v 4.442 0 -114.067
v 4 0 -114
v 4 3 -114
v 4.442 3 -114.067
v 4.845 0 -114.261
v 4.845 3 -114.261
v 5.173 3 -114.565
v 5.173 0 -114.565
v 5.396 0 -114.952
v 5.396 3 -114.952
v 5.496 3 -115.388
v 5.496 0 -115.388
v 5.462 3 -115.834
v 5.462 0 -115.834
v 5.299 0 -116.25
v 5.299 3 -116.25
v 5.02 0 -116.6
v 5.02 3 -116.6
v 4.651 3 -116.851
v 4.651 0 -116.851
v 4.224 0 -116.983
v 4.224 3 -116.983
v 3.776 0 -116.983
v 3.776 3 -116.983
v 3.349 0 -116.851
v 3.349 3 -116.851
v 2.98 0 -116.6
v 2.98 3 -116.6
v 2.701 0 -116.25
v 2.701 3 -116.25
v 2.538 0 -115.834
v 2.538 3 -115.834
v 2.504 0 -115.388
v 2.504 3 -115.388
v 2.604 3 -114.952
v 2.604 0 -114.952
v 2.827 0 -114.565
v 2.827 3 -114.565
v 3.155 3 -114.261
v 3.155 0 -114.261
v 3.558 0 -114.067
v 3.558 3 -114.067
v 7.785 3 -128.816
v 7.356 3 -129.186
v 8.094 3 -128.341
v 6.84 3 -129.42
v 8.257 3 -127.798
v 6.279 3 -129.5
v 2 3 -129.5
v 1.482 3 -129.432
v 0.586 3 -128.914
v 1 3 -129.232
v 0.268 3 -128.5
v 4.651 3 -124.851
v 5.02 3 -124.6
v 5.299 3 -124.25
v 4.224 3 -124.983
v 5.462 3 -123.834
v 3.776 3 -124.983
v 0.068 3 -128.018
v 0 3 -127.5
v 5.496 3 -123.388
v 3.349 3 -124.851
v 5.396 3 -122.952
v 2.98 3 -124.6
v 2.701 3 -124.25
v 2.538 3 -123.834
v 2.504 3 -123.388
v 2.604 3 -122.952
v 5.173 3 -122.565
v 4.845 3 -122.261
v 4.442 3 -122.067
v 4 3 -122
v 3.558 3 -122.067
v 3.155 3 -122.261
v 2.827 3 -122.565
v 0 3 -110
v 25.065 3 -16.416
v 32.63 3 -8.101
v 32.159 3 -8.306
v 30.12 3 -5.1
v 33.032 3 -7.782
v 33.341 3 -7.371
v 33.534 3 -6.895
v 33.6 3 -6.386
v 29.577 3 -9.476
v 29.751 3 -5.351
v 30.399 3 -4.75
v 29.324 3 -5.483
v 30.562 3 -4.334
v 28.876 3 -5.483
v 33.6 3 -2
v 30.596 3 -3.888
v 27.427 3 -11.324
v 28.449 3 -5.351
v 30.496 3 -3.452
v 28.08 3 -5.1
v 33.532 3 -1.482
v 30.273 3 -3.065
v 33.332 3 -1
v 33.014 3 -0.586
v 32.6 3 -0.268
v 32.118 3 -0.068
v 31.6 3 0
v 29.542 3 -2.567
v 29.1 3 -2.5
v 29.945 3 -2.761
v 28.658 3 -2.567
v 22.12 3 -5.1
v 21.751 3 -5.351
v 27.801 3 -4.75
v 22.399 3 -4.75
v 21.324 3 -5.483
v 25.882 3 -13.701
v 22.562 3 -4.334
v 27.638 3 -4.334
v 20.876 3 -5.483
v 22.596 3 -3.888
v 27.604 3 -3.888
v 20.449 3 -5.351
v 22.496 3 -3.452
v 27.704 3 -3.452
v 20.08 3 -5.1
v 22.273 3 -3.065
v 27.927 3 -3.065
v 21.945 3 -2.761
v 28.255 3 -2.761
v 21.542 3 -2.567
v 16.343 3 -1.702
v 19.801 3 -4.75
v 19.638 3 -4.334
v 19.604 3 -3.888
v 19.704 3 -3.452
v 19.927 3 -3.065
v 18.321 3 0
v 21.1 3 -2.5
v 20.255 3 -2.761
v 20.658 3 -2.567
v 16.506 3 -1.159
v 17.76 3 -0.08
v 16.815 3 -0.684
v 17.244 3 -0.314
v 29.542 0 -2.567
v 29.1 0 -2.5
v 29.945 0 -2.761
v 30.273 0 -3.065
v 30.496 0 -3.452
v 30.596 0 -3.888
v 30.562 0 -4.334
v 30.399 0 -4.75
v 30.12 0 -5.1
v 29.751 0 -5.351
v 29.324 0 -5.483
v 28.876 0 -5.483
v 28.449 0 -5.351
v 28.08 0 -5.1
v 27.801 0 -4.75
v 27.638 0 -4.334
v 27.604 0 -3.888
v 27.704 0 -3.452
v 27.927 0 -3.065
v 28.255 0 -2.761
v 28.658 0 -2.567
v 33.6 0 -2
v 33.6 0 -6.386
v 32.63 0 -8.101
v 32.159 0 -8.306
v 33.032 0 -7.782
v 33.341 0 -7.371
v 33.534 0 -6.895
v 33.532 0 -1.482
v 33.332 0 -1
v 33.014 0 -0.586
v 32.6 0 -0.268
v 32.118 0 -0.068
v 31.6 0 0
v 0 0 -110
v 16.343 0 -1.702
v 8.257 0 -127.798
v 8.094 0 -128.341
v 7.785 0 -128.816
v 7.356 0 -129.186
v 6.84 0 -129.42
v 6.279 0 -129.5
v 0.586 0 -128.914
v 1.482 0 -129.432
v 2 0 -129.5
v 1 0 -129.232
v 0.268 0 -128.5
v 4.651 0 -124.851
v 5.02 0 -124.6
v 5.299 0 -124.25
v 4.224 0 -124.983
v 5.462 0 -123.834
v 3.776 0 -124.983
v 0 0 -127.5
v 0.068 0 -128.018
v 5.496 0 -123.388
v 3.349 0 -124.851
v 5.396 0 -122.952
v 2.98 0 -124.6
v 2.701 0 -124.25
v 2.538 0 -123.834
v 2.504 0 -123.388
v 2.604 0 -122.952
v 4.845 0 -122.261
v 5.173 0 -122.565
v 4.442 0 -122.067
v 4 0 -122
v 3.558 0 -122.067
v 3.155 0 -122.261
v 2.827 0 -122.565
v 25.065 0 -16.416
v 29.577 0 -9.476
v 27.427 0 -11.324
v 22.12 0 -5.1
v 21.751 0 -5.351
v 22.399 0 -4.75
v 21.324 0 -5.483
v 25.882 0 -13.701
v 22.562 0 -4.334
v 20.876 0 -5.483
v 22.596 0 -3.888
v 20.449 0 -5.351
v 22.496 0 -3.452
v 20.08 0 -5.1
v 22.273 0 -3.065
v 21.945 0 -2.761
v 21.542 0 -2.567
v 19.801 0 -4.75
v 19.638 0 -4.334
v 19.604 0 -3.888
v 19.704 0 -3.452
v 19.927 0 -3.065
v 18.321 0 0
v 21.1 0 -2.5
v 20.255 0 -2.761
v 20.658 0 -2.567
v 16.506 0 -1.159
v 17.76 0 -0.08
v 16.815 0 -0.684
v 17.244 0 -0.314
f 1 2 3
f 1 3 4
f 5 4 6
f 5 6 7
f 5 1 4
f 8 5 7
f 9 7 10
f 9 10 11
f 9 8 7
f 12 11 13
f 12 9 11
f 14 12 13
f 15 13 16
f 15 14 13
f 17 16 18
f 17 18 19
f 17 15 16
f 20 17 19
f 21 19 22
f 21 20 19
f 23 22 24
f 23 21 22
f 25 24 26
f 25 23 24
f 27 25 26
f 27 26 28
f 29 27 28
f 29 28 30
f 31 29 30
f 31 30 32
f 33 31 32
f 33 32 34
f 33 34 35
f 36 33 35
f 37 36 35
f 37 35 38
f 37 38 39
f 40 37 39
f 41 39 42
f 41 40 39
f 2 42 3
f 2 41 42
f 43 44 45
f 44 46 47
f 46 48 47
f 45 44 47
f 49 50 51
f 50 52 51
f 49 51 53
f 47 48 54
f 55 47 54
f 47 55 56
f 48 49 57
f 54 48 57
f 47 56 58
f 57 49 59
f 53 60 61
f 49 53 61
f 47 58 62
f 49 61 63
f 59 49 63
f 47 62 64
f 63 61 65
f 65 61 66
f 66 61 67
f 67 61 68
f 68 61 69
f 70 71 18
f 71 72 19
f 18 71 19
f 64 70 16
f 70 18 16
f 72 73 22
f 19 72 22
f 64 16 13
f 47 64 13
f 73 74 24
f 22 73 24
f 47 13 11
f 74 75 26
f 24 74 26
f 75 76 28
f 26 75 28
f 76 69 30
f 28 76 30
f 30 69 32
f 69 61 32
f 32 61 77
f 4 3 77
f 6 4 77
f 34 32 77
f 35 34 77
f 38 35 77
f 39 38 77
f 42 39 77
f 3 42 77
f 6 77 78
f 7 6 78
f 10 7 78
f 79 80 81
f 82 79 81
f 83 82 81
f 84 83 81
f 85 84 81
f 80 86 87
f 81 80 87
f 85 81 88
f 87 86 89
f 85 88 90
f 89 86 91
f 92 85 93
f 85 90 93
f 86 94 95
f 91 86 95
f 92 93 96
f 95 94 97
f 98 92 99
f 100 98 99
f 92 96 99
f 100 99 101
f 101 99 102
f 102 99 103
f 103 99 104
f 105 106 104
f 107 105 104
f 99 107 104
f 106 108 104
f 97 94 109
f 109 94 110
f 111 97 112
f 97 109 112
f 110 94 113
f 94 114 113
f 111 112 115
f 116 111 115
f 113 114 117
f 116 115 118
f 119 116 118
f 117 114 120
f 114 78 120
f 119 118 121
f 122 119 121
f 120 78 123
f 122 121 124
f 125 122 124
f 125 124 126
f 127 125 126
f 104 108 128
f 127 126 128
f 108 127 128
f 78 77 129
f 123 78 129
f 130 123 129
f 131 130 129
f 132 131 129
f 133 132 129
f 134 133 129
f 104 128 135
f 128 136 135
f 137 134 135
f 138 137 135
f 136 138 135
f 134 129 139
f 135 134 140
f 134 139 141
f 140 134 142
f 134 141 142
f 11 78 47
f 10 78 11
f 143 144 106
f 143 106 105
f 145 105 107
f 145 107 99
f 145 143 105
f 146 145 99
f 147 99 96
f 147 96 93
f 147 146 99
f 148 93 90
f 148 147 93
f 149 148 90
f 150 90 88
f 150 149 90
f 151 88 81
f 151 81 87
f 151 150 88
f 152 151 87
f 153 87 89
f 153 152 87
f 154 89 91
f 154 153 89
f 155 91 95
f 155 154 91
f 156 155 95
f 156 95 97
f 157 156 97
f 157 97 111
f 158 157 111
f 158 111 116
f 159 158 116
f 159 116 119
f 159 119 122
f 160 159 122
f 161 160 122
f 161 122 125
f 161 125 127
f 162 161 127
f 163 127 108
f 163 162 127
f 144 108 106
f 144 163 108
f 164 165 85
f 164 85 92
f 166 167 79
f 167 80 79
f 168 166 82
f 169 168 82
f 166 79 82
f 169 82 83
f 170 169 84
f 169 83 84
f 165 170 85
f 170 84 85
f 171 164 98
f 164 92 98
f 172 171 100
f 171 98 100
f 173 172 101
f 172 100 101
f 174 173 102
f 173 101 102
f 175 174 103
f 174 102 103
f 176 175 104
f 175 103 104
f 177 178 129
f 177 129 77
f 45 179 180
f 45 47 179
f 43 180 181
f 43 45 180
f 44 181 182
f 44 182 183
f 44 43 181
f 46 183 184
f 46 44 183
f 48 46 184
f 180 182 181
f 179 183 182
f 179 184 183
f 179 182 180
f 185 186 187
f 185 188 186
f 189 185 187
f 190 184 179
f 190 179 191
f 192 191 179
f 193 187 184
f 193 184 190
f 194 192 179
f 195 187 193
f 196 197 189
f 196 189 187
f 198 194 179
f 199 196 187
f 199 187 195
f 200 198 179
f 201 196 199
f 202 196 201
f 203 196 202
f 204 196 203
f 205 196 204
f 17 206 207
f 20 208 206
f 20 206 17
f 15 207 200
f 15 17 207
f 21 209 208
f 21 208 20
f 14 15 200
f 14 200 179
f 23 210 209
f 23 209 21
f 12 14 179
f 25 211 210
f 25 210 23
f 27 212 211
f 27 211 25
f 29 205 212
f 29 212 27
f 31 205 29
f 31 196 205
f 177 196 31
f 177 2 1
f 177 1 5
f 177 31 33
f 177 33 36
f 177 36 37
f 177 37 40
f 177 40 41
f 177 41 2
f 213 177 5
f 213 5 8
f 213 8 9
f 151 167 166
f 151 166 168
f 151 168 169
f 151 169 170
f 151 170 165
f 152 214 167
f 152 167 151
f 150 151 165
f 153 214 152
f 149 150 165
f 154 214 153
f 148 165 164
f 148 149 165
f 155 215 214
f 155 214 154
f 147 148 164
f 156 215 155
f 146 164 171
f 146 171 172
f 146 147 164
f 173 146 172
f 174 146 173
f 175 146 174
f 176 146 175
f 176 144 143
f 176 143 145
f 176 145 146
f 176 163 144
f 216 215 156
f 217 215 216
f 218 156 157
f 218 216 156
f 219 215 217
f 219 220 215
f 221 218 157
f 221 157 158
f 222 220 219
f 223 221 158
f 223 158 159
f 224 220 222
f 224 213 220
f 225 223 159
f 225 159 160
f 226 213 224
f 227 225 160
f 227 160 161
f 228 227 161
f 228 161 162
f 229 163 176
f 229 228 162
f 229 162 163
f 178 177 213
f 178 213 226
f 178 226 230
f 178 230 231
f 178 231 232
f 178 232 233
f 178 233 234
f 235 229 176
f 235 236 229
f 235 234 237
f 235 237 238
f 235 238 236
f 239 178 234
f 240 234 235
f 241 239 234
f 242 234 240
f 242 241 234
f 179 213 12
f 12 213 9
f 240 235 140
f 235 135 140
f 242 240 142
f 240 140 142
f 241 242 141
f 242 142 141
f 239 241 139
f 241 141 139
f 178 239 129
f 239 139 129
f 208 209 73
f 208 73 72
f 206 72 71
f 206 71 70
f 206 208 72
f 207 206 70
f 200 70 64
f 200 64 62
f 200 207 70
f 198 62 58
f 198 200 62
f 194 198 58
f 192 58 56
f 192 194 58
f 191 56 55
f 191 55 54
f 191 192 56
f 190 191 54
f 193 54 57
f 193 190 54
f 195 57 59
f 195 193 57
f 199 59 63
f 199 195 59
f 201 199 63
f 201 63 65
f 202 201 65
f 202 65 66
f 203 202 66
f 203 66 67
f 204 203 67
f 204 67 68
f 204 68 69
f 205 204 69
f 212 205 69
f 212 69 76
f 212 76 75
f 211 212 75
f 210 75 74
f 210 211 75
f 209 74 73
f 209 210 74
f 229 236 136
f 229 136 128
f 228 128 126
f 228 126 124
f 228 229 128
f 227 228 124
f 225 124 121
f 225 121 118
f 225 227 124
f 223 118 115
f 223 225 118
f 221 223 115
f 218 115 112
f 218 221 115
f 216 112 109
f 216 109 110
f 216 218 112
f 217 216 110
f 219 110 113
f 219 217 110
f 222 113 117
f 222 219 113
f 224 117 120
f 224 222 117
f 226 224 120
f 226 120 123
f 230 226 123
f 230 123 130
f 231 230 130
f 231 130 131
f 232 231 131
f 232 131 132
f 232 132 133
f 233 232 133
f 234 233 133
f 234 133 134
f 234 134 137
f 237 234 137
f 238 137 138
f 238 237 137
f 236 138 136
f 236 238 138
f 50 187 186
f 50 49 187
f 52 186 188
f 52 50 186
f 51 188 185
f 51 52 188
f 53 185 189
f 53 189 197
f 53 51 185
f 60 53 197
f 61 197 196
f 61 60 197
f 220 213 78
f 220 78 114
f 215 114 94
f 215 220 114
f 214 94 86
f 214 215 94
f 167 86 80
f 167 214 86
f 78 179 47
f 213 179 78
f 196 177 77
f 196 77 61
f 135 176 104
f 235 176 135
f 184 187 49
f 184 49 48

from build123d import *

# Parameters (mm, degrees)
SKETCH_1_R      = 1.5
EXTRUDE_1_DEPTH = 3
FILLET_1_R      = 10
FILLET_2_R      = 2
FILLET_3_R      = 2


with BuildPart() as part:
    # 草图1 → 凸台-拉伸1 (new body)
    with BuildSketch(Plane(origin=(0, 0, 0), x_dir=(1, 0, 0), z_dir=(0, 1, 0))):
        Polygon((0, 110), (0, 129.5), (8, 129.5), (26.335454545, 8), (33.6, 8), (33.6, 0), (16.6, 0), align=None)
        with Locations(Location((21.1, 4, 0), (0, 0, 270))):
            Circle(SKETCH_1_R, mode=Mode.SUBTRACT)
        with Locations(Location((29.1, 4, 0), (0, 0, 270))):
            Circle(SKETCH_1_R, mode=Mode.SUBTRACT)
        with Locations(Location((4, 115.5, 0), (0, 0, 270))):
            Circle(SKETCH_1_R, mode=Mode.SUBTRACT)
        with Locations(Location((4, 123.5, 0), (0, 0, 270))):
            Circle(SKETCH_1_R, mode=Mode.SUBTRACT)
    extrude(amount=EXTRUDE_1_DEPTH)

    # 圆角1
    # the kernel refuses this fillet: 10 mm, written as the material it adds along each edge
    with BuildSketch(Plane(origin=(26.335454545, 0, -8), x_dir=(-0.1492195266498612, 0, -0.9888040922581132), z_dir=(0, 1, 0))) as fillet_1_piece_1:
        with BuildLine():
            CenterArc((8.51107561, -10), FILLET_1_R, 90, 73.639575316)
            Line((-1.084012034, -7.183212274), (-1.275913787, -7.126876519))
            ThreePointArc((-1.275913787, -7.126876519), (-0.739766835, -3.561762232), (-0.197760818, 0.029843905))
            Line((-0.197760818, 0.029843905), (0, 0.2))
            Line((0, 0.2), (8.51107561, 0.2))
            Line((8.51107561, 0.2), (8.51107561, 0))
        make_face()
    extrude(amount=3)

    # 圆角2
    fillet_2_edges = [part.edges().sort_by_distance(p)[0] for p in [
        (0, 1.5, -129.5),
        (8, 1.5, -129.5),
        (33.6, 1.5, 0),
        (16.6, 1.5, 0),
    ]]
    fillet(fillet_2_edges, radius=FILLET_2_R)

    # 圆角3
    fillet_3_edges = [part.edges().sort_by_distance(p)[0] for p in [
        (33.6, 1.5, -8),
    ]]
    fillet(fillet_3_edges, radius=FILLET_3_R)


solid = part.part
